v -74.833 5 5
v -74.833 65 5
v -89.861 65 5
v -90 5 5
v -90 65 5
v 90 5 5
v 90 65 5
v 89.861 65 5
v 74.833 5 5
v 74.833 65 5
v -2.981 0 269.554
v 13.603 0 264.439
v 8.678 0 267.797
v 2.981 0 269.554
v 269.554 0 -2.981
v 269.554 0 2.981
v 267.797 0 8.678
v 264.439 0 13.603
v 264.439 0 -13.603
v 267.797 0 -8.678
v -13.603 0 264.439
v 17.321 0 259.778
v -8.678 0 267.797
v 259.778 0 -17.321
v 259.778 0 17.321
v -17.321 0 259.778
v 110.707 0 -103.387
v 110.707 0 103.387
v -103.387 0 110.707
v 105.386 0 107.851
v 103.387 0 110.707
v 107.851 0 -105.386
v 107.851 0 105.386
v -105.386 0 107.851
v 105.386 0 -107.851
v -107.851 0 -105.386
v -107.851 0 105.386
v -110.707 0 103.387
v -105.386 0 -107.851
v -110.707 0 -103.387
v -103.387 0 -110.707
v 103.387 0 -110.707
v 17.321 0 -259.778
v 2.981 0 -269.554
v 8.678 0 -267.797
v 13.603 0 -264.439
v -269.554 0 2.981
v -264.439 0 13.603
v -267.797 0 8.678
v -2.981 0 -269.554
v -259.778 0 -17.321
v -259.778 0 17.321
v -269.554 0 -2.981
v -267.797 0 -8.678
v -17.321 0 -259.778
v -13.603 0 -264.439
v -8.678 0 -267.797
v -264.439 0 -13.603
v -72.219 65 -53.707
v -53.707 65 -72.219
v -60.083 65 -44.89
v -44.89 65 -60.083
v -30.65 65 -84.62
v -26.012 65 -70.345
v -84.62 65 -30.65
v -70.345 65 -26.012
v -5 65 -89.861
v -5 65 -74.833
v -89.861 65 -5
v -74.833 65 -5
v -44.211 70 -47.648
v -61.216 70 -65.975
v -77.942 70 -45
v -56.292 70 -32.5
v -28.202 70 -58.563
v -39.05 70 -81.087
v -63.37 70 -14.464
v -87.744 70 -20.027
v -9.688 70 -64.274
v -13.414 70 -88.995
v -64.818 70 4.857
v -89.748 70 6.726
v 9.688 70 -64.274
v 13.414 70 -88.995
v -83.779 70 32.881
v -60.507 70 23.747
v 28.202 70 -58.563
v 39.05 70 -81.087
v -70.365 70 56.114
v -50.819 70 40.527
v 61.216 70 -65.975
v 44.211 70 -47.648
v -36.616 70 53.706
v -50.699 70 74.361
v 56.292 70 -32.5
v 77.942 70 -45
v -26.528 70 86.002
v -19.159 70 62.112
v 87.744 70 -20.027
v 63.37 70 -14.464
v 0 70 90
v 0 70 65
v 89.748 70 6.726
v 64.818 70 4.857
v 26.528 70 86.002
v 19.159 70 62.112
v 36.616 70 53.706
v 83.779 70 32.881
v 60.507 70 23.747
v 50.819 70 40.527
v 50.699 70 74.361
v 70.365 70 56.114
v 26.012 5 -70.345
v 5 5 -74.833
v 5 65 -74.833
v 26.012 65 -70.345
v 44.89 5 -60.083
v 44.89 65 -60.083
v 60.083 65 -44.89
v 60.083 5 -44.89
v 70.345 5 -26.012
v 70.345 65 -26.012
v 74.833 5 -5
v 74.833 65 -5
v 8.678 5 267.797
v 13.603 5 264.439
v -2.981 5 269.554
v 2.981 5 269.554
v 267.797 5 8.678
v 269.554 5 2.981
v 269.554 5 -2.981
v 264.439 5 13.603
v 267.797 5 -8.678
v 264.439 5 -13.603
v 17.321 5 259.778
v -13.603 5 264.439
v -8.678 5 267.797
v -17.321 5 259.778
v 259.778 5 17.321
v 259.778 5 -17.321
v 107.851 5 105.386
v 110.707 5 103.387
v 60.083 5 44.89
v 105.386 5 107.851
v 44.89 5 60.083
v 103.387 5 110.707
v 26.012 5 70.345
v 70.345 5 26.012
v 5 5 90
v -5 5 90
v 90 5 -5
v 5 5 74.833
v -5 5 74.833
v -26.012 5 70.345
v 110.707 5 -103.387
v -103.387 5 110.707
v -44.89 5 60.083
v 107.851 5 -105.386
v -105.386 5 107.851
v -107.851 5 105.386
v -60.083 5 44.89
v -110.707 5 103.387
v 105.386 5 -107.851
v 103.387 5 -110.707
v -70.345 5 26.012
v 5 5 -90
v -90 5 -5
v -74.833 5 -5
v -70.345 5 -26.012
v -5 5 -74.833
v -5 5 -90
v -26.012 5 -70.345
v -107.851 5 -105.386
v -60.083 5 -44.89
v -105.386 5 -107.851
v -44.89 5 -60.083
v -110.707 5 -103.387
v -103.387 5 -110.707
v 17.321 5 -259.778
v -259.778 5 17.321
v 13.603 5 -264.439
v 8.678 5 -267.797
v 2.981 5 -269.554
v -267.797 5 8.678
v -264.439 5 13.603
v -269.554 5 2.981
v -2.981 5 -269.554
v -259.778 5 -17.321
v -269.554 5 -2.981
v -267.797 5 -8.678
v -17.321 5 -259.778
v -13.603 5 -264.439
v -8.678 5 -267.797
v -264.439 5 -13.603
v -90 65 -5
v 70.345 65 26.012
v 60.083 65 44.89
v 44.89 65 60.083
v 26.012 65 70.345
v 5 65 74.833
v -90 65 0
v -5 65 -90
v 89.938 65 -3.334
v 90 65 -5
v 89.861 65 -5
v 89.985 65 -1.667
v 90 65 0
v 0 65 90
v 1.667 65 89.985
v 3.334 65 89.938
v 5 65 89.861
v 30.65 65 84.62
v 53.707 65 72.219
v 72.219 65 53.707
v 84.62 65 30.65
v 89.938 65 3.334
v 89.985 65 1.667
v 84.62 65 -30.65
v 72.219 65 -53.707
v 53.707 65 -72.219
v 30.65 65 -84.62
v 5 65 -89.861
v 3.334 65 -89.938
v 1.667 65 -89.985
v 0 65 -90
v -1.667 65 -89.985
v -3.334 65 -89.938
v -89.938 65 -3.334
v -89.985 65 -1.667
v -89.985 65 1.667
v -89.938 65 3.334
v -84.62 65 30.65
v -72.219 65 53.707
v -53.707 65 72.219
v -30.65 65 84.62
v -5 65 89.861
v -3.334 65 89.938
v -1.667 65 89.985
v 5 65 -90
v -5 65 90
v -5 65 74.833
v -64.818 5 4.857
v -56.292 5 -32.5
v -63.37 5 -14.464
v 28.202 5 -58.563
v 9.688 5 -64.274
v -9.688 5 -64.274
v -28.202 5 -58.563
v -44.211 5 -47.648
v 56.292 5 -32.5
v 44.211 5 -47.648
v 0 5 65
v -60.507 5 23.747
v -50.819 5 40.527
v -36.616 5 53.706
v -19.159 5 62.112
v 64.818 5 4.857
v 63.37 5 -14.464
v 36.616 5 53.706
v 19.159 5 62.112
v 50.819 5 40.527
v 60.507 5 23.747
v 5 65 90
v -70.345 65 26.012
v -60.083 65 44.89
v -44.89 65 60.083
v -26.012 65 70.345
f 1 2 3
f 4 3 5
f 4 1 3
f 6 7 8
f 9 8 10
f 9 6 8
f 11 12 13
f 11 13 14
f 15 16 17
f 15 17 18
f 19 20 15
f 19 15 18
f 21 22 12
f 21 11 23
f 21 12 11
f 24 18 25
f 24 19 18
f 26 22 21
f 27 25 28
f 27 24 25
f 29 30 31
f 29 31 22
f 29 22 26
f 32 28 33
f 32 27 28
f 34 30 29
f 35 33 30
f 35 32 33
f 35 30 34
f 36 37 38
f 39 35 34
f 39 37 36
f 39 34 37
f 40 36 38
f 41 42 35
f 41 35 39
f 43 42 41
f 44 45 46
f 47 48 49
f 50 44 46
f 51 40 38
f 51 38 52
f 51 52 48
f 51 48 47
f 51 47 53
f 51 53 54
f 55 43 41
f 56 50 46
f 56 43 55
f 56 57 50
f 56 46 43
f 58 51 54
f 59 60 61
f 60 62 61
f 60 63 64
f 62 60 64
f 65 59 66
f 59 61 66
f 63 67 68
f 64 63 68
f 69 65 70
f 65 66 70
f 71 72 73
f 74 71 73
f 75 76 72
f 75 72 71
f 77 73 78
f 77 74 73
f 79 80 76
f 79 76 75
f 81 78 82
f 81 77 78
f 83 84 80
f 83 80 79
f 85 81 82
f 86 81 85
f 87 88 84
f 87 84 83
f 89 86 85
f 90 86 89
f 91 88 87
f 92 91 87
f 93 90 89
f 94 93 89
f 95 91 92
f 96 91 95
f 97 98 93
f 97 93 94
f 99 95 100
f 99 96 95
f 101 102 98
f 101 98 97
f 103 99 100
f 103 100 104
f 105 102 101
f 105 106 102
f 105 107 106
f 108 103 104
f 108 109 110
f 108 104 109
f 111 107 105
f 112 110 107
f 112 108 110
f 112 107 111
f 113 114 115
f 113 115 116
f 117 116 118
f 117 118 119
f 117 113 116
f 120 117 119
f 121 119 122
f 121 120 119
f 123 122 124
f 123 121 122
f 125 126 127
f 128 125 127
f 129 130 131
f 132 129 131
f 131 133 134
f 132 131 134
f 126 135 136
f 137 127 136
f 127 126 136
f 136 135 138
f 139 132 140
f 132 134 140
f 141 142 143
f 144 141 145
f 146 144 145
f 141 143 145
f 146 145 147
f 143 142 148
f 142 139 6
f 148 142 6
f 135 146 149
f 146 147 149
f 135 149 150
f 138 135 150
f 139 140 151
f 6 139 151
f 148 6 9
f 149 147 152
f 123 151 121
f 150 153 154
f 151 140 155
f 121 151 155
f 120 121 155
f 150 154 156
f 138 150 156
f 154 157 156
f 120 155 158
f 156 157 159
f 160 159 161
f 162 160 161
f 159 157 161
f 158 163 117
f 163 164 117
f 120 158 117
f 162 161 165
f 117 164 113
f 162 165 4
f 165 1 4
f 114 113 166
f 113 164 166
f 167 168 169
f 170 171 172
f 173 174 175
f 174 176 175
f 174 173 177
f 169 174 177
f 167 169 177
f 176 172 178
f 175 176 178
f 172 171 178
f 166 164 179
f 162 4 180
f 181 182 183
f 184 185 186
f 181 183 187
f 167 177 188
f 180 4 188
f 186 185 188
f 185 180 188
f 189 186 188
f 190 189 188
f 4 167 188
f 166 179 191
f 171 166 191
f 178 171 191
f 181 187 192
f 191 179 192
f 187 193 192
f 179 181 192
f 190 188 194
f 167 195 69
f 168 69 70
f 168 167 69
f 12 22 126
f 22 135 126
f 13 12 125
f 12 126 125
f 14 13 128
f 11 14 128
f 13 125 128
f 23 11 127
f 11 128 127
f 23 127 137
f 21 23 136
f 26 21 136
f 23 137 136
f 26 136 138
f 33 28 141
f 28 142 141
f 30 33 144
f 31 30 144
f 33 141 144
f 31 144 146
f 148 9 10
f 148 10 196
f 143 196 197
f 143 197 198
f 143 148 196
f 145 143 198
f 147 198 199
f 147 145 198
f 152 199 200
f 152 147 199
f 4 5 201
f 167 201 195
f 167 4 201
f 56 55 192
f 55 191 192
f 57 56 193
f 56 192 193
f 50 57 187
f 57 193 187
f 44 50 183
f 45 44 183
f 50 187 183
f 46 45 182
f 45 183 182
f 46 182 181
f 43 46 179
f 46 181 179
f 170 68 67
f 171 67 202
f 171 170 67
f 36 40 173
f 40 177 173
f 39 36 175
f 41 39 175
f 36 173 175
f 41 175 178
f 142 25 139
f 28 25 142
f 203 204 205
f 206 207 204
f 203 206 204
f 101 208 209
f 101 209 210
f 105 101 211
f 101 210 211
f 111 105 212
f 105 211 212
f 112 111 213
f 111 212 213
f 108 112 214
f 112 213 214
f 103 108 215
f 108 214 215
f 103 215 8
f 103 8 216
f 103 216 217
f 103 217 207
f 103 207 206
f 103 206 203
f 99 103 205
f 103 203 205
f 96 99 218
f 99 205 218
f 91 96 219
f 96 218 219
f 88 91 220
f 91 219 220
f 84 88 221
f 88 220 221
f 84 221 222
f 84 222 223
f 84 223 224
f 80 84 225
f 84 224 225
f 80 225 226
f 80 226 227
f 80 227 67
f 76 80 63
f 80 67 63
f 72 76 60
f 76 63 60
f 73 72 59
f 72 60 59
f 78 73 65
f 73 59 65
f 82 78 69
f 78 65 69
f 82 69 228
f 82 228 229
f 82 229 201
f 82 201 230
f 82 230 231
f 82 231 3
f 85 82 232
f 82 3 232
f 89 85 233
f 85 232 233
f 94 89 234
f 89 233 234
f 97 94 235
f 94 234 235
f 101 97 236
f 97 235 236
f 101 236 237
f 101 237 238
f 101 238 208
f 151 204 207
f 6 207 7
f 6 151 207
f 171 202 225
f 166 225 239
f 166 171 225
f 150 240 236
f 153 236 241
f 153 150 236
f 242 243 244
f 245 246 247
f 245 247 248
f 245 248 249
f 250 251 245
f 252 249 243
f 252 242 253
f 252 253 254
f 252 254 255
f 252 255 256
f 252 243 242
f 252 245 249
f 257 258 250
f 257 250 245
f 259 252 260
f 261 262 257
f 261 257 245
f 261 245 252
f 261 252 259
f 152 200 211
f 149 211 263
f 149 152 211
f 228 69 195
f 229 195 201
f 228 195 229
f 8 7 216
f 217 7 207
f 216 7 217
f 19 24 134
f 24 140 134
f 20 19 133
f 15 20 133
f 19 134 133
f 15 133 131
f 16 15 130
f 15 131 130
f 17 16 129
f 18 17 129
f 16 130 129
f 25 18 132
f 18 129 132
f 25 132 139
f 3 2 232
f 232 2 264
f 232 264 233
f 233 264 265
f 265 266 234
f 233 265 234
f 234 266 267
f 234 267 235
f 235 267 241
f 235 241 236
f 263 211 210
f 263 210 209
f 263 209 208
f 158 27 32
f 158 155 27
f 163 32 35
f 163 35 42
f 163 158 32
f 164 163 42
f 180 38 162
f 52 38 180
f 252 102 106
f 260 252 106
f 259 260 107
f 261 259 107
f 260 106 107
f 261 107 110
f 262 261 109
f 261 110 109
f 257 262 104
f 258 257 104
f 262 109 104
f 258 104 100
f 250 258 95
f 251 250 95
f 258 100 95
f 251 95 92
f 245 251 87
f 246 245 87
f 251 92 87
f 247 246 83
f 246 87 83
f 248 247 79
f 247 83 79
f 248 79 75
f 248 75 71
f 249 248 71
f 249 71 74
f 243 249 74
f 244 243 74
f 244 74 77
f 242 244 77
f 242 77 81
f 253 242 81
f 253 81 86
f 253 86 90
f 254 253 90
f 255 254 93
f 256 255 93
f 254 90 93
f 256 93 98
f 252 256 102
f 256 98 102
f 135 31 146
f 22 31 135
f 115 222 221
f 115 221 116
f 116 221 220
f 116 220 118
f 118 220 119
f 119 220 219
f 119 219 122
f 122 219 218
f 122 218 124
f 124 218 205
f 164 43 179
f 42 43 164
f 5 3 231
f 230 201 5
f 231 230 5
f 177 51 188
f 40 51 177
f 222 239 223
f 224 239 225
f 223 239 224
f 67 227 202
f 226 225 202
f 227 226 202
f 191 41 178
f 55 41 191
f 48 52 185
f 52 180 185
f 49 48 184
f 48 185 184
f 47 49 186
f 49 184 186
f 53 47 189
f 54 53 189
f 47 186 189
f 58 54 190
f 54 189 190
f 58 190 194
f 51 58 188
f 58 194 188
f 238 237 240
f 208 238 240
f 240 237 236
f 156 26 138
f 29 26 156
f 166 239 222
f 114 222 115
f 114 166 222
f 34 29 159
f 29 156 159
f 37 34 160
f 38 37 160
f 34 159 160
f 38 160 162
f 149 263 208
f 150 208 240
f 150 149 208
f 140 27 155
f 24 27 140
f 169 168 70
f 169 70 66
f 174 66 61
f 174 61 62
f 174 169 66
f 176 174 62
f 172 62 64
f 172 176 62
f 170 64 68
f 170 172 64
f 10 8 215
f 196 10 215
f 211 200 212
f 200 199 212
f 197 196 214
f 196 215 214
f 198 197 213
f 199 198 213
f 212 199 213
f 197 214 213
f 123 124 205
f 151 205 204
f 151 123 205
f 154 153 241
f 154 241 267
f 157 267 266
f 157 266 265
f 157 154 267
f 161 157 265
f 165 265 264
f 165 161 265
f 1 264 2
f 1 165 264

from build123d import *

# Parameters (mm, degrees)
EXTRUIR1_DEPTH = 5
REDONDEO1_R    = 20
EXTRUIR3_DEPTH = 60
CROQUIS4_R     = 90
EXTRUIR4_DEPTH = 5
CROQUIS5_R     = 65
EXTRUIR5_DEPTH = 65


with BuildPart() as part:
    # Croquis1 → Extruir1 (new body)
    with BuildSketch(Plane(origin=(0, 0, 0), x_dir=(1, 0, 0), z_dir=(0, 1, 0))):
        Polygon((106.066017178, 106.066017178), (289.777747887, 0), (106.066017178, -106.066017178), (0, -289.777747887), (-106.066017178, -106.066017178), (-289.777747887, 0), (-106.066017178, 106.066017178), (0, 289.777747887), align=None)
    extrude(amount=EXTRUIR1_DEPTH)

    # Redondeo1
    redondeo1_edges = [part.edges().sort_by_distance(p)[0] for p in [
        (106.066017178, 2.5, -106.066017178),
        (289.777747887, 2.5, 0),
        (106.066017178, 2.5, 106.066017178),
        (0, 2.5, 289.777747887),
        (-106.066017178, 2.5, 106.066017178),
        (-289.777747887, 2.5, 0),
        (-106.066017178, 2.5, -106.066017178),
        (0, 2.5, -289.777747887),
    ]]
    fillet(redondeo1_edges, radius=REDONDEO1_R)

    # Croquis2 → Extruir3 (add)
    with BuildSketch(Plane(origin=(0, 5, 0), x_dir=(1, 0, 0), z_dir=(0, 1, 0))):
        with BuildLine():
            Line((74.833147735, 5), (90, 5))
            Line((90, 5), (90, -5))
            Line((90, -5), (74.833147735, -5))
            ThreePointArc((74.833147735, -5), (53.033008589, -53.033008589), (5, -74.833147735))
            Line((5, -74.833147735), (5, -90))
            Line((5, -90), (-5, -90))
            Line((-5, -90), (-5, -74.833147735))
            ThreePointArc((-5, -74.833147735), (-53.033008589, -53.033008589), (-74.833147735, -5))
            Line((-74.833147735, -5), (-90, -5))
            Line((-90, -5), (-90, 5))
            Line((-90, 5), (-74.833147735, 5))
            ThreePointArc((-74.833147735, 5), (-53.033008589, 53.033008589), (-5, 74.833147735))
            Line((-5, 74.833147735), (-5, 90))
            Line((-5, 90), (5, 90))
            Line((5, 90), (5, 74.833147735))
            ThreePointArc((5, 74.833147735), (53.033008589, 53.033008589), (74.833147735, 5))
        make_face()
    extrude(amount=EXTRUIR3_DEPTH)

    # Croquis4 → Extruir4 (add)
    with BuildSketch(Plane(origin=(0, 65, 0), x_dir=(1, 0, 0), z_dir=(0, 1, 0))):
        with Locations(Location((0, 0, 0), (0, 0, 270))):
            Circle(CROQUIS4_R)
    extrude(amount=EXTRUIR4_DEPTH)

    # Croquis5 → Extruir5 (cut)
    with BuildSketch(Plane(origin=(0, 70, 0), x_dir=(1, 0, 0), z_dir=(0, 1, 0))):
        with Locations(Location((0, 0, 0), (0, 0, 270))):
            Circle(CROQUIS5_R)
    extrude(amount=-EXTRUIR5_DEPTH, mode=Mode.SUBTRACT)


solid = part.part
